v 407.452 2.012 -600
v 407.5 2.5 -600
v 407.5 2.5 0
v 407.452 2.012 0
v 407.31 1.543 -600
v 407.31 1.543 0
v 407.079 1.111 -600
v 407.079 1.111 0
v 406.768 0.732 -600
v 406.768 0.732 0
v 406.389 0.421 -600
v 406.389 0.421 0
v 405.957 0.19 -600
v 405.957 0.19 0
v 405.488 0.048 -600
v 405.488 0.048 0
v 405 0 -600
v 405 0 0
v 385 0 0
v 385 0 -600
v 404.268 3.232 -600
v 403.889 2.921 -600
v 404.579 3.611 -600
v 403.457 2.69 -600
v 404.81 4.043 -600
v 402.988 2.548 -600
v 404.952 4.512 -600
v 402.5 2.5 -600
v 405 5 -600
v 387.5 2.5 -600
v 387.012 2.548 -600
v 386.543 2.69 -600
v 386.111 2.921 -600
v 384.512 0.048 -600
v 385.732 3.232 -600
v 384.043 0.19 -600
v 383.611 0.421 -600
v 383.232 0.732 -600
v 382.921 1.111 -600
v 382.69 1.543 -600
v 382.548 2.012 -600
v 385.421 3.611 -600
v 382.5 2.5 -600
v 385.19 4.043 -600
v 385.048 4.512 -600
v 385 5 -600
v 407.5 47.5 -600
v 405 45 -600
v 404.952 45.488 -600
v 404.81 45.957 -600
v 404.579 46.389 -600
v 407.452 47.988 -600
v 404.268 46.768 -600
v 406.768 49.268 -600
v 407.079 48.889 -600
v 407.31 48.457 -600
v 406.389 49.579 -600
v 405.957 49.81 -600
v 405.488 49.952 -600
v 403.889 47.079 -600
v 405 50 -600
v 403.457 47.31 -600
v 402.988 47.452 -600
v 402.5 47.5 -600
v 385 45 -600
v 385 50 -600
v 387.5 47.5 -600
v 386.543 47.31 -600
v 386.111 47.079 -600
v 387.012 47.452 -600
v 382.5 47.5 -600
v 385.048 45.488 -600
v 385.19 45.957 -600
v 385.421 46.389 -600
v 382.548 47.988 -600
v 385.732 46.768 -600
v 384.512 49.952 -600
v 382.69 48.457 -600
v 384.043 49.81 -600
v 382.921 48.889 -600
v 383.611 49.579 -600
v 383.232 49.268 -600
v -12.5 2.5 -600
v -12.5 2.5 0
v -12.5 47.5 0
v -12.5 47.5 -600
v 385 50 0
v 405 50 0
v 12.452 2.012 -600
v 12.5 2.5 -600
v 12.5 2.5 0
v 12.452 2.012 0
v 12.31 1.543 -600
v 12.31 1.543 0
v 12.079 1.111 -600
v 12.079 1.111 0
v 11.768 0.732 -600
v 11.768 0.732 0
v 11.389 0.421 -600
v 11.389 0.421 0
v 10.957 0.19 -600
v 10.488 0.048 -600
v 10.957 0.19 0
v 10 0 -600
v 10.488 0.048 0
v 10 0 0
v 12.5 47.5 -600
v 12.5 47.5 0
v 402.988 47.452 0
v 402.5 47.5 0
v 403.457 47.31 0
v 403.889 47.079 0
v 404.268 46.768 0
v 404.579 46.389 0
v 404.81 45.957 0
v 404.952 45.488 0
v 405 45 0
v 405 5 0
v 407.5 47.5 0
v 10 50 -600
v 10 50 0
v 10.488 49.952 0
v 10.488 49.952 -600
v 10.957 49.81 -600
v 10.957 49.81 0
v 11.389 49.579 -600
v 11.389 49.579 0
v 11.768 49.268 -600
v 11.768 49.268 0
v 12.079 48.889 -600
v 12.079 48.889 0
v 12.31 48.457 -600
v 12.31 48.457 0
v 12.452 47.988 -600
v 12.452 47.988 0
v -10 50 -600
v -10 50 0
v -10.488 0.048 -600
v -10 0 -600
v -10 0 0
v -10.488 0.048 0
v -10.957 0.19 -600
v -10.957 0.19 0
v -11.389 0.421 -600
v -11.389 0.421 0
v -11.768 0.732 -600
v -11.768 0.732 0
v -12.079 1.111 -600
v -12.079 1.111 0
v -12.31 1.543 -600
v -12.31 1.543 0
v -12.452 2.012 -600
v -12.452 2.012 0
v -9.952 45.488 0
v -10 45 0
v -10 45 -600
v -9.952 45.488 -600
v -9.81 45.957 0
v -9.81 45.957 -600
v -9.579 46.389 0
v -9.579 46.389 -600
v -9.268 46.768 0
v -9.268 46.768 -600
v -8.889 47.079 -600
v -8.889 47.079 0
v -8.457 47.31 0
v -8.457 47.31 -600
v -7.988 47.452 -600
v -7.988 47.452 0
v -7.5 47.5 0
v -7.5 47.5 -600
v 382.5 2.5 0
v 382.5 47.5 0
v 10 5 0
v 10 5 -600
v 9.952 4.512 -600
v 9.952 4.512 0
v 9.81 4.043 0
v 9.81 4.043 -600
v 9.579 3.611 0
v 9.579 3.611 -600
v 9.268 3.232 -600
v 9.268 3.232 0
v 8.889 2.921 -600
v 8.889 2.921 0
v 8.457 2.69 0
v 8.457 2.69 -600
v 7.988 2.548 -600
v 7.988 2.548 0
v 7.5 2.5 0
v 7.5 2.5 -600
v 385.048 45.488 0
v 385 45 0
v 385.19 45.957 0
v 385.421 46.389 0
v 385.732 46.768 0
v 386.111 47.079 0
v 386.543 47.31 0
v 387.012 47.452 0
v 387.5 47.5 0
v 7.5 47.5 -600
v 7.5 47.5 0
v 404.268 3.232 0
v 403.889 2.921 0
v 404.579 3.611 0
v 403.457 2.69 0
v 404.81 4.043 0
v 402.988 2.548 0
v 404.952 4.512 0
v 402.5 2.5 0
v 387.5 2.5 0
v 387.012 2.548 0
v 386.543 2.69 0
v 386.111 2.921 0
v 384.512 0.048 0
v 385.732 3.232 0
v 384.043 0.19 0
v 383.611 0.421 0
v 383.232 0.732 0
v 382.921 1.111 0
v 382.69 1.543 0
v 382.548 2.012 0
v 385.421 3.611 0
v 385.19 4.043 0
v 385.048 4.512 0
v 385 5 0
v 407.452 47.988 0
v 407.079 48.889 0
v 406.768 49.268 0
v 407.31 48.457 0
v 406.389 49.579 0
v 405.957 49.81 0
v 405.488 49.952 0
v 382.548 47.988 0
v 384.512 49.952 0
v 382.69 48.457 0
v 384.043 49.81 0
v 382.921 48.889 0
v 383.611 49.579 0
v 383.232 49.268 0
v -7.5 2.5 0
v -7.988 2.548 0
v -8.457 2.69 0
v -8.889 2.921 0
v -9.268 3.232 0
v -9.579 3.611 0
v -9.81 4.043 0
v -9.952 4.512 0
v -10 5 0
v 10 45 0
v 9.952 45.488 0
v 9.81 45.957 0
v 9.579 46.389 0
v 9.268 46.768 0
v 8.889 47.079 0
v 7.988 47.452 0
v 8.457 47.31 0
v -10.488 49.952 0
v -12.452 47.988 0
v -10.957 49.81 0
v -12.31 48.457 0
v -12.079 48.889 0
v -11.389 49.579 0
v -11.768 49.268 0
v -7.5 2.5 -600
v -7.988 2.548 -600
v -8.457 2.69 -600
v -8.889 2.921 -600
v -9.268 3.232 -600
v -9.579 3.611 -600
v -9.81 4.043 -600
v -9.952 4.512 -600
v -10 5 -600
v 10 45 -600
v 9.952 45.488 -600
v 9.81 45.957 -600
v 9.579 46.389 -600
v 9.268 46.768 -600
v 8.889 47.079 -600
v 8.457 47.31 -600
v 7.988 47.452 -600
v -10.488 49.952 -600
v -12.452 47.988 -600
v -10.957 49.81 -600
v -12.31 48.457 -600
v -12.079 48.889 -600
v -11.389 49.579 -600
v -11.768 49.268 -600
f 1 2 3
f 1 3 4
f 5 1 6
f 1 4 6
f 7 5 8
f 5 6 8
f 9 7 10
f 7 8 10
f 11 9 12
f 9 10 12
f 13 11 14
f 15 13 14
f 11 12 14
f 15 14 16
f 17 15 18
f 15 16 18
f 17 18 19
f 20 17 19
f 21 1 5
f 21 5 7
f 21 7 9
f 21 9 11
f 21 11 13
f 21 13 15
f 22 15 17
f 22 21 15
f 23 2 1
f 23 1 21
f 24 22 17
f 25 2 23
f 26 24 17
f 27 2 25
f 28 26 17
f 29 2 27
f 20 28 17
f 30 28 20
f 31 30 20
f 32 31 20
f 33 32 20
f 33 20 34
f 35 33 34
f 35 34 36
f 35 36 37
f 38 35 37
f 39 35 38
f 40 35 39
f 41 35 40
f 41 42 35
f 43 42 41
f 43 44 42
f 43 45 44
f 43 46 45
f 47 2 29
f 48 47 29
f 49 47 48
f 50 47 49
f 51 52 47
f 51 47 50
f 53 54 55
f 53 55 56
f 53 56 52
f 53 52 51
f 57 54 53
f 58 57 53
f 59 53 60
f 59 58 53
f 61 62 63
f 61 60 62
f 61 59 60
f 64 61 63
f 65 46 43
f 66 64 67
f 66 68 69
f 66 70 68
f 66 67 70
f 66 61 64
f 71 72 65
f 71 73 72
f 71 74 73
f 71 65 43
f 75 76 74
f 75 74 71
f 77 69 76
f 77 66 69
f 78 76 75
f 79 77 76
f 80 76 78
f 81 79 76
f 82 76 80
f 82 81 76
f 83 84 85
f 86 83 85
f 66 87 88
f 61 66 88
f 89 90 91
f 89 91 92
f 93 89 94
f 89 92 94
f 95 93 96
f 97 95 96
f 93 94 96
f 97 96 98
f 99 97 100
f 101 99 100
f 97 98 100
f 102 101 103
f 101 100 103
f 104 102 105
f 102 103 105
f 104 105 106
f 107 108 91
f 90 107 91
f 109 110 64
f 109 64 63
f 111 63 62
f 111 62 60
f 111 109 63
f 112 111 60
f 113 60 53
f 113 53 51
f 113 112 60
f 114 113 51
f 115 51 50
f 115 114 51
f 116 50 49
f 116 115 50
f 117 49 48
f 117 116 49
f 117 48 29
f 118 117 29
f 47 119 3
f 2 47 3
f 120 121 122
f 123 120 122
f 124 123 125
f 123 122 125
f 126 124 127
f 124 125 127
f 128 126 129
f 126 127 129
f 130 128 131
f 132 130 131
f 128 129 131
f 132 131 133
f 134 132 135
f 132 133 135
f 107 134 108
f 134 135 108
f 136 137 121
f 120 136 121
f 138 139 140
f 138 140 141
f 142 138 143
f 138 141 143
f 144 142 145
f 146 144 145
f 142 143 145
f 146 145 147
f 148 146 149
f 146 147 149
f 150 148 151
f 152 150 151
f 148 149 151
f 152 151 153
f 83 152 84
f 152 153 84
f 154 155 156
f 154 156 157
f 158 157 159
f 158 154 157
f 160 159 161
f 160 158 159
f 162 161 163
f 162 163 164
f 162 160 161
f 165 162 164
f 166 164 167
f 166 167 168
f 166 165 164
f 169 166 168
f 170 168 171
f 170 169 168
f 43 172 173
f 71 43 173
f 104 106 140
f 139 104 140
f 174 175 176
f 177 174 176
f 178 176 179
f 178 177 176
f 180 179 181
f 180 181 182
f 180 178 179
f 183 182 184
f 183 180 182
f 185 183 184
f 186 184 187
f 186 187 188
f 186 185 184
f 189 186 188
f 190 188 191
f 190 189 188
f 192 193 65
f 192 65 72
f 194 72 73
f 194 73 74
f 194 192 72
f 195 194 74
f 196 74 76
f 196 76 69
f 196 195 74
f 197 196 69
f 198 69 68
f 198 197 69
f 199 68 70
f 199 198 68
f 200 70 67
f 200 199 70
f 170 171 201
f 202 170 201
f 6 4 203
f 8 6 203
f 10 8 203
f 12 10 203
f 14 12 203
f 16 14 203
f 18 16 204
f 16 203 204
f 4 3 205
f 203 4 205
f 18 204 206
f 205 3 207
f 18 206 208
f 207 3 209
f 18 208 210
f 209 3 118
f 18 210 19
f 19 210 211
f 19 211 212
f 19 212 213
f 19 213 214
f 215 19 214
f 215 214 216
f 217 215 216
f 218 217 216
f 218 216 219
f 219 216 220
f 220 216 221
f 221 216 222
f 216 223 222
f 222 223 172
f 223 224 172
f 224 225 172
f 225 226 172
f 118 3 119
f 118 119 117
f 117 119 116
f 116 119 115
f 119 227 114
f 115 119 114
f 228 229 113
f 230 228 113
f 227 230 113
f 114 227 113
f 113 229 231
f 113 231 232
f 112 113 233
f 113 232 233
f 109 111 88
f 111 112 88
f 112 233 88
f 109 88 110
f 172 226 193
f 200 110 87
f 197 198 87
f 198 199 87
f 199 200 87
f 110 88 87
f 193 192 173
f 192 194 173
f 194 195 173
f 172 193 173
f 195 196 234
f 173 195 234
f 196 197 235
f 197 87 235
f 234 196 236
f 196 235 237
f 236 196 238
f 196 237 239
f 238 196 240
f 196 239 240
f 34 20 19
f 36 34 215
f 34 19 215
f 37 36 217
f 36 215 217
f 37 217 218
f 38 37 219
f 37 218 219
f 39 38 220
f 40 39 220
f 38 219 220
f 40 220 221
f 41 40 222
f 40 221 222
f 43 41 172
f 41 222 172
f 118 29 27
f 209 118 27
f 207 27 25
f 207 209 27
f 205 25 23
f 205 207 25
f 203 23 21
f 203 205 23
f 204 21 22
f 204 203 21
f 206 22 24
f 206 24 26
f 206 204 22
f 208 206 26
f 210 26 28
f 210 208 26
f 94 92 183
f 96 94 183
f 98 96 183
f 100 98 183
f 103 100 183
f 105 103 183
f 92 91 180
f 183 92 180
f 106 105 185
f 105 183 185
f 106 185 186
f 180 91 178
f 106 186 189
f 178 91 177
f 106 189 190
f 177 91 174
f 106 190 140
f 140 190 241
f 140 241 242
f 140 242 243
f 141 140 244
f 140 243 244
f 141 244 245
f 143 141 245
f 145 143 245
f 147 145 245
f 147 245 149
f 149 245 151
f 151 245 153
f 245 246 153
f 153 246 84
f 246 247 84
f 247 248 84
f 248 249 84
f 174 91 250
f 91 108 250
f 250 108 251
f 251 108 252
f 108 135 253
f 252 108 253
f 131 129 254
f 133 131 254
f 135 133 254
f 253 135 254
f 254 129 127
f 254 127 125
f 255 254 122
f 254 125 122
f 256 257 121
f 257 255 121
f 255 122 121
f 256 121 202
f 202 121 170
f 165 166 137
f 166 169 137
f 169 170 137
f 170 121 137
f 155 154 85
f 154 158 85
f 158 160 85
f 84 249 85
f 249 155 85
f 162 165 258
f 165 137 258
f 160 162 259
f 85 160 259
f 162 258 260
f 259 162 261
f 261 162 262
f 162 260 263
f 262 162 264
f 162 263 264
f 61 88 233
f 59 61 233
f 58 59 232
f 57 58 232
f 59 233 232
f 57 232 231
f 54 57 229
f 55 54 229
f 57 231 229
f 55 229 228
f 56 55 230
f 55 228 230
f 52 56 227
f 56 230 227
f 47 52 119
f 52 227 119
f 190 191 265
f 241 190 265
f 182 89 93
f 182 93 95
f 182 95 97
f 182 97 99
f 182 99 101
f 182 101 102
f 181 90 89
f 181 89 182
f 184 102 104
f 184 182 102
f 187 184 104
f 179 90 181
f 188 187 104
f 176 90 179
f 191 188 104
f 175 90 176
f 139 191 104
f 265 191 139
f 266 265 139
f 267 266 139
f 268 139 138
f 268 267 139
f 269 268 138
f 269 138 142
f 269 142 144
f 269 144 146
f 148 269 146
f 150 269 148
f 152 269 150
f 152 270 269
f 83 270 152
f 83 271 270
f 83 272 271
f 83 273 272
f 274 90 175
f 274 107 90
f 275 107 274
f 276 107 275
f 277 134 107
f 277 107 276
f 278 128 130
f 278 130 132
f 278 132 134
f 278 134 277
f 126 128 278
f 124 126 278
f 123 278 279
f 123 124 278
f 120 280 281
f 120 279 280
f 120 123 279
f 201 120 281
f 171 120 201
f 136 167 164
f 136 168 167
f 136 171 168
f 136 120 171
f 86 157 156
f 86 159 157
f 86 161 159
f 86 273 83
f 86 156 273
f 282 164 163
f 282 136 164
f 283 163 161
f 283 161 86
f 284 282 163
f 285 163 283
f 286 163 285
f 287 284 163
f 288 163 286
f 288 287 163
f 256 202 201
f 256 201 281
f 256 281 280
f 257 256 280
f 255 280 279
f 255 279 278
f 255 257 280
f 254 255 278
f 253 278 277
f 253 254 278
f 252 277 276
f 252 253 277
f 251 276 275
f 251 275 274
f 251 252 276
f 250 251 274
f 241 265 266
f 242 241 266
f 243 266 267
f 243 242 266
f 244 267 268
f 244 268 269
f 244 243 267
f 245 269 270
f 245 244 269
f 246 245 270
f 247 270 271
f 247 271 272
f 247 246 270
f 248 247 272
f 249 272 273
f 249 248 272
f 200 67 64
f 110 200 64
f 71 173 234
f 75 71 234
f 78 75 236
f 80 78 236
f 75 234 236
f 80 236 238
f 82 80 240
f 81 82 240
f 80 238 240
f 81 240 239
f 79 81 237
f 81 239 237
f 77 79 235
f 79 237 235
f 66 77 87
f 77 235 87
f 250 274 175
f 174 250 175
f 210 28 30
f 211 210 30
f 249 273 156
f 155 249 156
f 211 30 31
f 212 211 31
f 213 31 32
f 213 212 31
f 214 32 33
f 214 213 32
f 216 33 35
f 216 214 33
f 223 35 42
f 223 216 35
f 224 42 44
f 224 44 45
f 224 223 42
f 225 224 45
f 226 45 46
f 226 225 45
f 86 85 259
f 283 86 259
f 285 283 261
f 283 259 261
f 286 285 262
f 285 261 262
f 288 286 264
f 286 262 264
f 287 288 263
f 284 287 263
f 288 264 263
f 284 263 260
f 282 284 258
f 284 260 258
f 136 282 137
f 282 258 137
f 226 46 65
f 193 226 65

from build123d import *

# Parameters (mm, degrees)
EXTRUDE_1_DEPTH   = 600
EXTRUDE_1_2_DEPTH = 600


with BuildPart() as part:
    # Эскиз1 → Бобышка-Вытянуть1 (new body)
    with BuildSketch(Plane.XY):
        with BuildLine():
            Line((-10, 50), (10, 50))
            ThreePointArc((10, 50), (11.767766953, 49.267766953), (12.5, 47.5))
            Line((12.5, 47.5), (12.5, 2.5))
            ThreePointArc((12.5, 2.5), (11.767766953, 0.732233047), (10, 0))
            Line((10, 0), (-10, 0))
            ThreePointArc((-10, 0), (-11.767766953, 0.732233047), (-12.5, 2.5))
            Line((-12.5, 2.5), (-12.5, 47.5))
            ThreePointArc((-12.5, 47.5), (-11.767766953, 49.267766953), (-10, 50))
        make_face()
        with BuildLine():
            Line((-7.5, 47.5), (7.5, 47.5))
            ThreePointArc((7.5, 47.5), (9.267766953, 46.767766953), (10, 45))
            Line((10, 45), (10, 5))
            ThreePointArc((10, 5), (9.267766953, 3.232233047), (7.5, 2.5))
            Line((7.5, 2.5), (-7.5, 2.5))
            ThreePointArc((-7.5, 2.5), (-9.267766953, 3.232233047), (-10, 5))
            Line((-10, 5), (-10, 45))
            ThreePointArc((-10, 45), (-9.267766953, 46.767766953), (-7.5, 47.5))
        make_face(mode=Mode.SUBTRACT)
    extrude(amount=-EXTRUDE_1_DEPTH)


with BuildPart() as body_2:
    # Эскиз1 → Extrude 1 2 (new body)
    with BuildSketch(Plane.XY):
        with BuildLine():
            Line((385, 50), (405, 50))
            ThreePointArc((405, 50), (406.767766953, 49.267766953), (407.5, 47.5))
            Line((407.5, 47.5), (407.5, 2.5))
            ThreePointArc((407.5, 2.5), (406.767766953, 0.732233047), (405, 0))
            Line((405, 0), (385, 0))
            ThreePointArc((385, 0), (383.232233047, 0.732233047), (382.5, 2.5))
            Line((382.5, 2.5), (382.5, 47.5))
            ThreePointArc((382.5, 47.5), (383.232233047, 49.267766953), (385, 50))
        make_face()
        with BuildLine():
            Line((387.5, 47.5), (402.5, 47.5))
            ThreePointArc((402.5, 47.5), (404.267766953, 46.767766953), (405, 45))
            Line((405, 45), (405, 5))
            ThreePointArc((405, 5), (404.267766953, 3.232233047), (402.5, 2.5))
            Line((402.5, 2.5), (387.5, 2.5))
            ThreePointArc((387.5, 2.5), (385.732233047, 3.232233047), (385, 5))
            Line((385, 5), (385, 45))
            ThreePointArc((385, 45), (385.732233047, 46.767766953), (387.5, 47.5))
        make_face(mode=Mode.SUBTRACT)
    extrude(amount=-EXTRUDE_1_2_DEPTH)


solid = Compound([part.part, body_2.part])
